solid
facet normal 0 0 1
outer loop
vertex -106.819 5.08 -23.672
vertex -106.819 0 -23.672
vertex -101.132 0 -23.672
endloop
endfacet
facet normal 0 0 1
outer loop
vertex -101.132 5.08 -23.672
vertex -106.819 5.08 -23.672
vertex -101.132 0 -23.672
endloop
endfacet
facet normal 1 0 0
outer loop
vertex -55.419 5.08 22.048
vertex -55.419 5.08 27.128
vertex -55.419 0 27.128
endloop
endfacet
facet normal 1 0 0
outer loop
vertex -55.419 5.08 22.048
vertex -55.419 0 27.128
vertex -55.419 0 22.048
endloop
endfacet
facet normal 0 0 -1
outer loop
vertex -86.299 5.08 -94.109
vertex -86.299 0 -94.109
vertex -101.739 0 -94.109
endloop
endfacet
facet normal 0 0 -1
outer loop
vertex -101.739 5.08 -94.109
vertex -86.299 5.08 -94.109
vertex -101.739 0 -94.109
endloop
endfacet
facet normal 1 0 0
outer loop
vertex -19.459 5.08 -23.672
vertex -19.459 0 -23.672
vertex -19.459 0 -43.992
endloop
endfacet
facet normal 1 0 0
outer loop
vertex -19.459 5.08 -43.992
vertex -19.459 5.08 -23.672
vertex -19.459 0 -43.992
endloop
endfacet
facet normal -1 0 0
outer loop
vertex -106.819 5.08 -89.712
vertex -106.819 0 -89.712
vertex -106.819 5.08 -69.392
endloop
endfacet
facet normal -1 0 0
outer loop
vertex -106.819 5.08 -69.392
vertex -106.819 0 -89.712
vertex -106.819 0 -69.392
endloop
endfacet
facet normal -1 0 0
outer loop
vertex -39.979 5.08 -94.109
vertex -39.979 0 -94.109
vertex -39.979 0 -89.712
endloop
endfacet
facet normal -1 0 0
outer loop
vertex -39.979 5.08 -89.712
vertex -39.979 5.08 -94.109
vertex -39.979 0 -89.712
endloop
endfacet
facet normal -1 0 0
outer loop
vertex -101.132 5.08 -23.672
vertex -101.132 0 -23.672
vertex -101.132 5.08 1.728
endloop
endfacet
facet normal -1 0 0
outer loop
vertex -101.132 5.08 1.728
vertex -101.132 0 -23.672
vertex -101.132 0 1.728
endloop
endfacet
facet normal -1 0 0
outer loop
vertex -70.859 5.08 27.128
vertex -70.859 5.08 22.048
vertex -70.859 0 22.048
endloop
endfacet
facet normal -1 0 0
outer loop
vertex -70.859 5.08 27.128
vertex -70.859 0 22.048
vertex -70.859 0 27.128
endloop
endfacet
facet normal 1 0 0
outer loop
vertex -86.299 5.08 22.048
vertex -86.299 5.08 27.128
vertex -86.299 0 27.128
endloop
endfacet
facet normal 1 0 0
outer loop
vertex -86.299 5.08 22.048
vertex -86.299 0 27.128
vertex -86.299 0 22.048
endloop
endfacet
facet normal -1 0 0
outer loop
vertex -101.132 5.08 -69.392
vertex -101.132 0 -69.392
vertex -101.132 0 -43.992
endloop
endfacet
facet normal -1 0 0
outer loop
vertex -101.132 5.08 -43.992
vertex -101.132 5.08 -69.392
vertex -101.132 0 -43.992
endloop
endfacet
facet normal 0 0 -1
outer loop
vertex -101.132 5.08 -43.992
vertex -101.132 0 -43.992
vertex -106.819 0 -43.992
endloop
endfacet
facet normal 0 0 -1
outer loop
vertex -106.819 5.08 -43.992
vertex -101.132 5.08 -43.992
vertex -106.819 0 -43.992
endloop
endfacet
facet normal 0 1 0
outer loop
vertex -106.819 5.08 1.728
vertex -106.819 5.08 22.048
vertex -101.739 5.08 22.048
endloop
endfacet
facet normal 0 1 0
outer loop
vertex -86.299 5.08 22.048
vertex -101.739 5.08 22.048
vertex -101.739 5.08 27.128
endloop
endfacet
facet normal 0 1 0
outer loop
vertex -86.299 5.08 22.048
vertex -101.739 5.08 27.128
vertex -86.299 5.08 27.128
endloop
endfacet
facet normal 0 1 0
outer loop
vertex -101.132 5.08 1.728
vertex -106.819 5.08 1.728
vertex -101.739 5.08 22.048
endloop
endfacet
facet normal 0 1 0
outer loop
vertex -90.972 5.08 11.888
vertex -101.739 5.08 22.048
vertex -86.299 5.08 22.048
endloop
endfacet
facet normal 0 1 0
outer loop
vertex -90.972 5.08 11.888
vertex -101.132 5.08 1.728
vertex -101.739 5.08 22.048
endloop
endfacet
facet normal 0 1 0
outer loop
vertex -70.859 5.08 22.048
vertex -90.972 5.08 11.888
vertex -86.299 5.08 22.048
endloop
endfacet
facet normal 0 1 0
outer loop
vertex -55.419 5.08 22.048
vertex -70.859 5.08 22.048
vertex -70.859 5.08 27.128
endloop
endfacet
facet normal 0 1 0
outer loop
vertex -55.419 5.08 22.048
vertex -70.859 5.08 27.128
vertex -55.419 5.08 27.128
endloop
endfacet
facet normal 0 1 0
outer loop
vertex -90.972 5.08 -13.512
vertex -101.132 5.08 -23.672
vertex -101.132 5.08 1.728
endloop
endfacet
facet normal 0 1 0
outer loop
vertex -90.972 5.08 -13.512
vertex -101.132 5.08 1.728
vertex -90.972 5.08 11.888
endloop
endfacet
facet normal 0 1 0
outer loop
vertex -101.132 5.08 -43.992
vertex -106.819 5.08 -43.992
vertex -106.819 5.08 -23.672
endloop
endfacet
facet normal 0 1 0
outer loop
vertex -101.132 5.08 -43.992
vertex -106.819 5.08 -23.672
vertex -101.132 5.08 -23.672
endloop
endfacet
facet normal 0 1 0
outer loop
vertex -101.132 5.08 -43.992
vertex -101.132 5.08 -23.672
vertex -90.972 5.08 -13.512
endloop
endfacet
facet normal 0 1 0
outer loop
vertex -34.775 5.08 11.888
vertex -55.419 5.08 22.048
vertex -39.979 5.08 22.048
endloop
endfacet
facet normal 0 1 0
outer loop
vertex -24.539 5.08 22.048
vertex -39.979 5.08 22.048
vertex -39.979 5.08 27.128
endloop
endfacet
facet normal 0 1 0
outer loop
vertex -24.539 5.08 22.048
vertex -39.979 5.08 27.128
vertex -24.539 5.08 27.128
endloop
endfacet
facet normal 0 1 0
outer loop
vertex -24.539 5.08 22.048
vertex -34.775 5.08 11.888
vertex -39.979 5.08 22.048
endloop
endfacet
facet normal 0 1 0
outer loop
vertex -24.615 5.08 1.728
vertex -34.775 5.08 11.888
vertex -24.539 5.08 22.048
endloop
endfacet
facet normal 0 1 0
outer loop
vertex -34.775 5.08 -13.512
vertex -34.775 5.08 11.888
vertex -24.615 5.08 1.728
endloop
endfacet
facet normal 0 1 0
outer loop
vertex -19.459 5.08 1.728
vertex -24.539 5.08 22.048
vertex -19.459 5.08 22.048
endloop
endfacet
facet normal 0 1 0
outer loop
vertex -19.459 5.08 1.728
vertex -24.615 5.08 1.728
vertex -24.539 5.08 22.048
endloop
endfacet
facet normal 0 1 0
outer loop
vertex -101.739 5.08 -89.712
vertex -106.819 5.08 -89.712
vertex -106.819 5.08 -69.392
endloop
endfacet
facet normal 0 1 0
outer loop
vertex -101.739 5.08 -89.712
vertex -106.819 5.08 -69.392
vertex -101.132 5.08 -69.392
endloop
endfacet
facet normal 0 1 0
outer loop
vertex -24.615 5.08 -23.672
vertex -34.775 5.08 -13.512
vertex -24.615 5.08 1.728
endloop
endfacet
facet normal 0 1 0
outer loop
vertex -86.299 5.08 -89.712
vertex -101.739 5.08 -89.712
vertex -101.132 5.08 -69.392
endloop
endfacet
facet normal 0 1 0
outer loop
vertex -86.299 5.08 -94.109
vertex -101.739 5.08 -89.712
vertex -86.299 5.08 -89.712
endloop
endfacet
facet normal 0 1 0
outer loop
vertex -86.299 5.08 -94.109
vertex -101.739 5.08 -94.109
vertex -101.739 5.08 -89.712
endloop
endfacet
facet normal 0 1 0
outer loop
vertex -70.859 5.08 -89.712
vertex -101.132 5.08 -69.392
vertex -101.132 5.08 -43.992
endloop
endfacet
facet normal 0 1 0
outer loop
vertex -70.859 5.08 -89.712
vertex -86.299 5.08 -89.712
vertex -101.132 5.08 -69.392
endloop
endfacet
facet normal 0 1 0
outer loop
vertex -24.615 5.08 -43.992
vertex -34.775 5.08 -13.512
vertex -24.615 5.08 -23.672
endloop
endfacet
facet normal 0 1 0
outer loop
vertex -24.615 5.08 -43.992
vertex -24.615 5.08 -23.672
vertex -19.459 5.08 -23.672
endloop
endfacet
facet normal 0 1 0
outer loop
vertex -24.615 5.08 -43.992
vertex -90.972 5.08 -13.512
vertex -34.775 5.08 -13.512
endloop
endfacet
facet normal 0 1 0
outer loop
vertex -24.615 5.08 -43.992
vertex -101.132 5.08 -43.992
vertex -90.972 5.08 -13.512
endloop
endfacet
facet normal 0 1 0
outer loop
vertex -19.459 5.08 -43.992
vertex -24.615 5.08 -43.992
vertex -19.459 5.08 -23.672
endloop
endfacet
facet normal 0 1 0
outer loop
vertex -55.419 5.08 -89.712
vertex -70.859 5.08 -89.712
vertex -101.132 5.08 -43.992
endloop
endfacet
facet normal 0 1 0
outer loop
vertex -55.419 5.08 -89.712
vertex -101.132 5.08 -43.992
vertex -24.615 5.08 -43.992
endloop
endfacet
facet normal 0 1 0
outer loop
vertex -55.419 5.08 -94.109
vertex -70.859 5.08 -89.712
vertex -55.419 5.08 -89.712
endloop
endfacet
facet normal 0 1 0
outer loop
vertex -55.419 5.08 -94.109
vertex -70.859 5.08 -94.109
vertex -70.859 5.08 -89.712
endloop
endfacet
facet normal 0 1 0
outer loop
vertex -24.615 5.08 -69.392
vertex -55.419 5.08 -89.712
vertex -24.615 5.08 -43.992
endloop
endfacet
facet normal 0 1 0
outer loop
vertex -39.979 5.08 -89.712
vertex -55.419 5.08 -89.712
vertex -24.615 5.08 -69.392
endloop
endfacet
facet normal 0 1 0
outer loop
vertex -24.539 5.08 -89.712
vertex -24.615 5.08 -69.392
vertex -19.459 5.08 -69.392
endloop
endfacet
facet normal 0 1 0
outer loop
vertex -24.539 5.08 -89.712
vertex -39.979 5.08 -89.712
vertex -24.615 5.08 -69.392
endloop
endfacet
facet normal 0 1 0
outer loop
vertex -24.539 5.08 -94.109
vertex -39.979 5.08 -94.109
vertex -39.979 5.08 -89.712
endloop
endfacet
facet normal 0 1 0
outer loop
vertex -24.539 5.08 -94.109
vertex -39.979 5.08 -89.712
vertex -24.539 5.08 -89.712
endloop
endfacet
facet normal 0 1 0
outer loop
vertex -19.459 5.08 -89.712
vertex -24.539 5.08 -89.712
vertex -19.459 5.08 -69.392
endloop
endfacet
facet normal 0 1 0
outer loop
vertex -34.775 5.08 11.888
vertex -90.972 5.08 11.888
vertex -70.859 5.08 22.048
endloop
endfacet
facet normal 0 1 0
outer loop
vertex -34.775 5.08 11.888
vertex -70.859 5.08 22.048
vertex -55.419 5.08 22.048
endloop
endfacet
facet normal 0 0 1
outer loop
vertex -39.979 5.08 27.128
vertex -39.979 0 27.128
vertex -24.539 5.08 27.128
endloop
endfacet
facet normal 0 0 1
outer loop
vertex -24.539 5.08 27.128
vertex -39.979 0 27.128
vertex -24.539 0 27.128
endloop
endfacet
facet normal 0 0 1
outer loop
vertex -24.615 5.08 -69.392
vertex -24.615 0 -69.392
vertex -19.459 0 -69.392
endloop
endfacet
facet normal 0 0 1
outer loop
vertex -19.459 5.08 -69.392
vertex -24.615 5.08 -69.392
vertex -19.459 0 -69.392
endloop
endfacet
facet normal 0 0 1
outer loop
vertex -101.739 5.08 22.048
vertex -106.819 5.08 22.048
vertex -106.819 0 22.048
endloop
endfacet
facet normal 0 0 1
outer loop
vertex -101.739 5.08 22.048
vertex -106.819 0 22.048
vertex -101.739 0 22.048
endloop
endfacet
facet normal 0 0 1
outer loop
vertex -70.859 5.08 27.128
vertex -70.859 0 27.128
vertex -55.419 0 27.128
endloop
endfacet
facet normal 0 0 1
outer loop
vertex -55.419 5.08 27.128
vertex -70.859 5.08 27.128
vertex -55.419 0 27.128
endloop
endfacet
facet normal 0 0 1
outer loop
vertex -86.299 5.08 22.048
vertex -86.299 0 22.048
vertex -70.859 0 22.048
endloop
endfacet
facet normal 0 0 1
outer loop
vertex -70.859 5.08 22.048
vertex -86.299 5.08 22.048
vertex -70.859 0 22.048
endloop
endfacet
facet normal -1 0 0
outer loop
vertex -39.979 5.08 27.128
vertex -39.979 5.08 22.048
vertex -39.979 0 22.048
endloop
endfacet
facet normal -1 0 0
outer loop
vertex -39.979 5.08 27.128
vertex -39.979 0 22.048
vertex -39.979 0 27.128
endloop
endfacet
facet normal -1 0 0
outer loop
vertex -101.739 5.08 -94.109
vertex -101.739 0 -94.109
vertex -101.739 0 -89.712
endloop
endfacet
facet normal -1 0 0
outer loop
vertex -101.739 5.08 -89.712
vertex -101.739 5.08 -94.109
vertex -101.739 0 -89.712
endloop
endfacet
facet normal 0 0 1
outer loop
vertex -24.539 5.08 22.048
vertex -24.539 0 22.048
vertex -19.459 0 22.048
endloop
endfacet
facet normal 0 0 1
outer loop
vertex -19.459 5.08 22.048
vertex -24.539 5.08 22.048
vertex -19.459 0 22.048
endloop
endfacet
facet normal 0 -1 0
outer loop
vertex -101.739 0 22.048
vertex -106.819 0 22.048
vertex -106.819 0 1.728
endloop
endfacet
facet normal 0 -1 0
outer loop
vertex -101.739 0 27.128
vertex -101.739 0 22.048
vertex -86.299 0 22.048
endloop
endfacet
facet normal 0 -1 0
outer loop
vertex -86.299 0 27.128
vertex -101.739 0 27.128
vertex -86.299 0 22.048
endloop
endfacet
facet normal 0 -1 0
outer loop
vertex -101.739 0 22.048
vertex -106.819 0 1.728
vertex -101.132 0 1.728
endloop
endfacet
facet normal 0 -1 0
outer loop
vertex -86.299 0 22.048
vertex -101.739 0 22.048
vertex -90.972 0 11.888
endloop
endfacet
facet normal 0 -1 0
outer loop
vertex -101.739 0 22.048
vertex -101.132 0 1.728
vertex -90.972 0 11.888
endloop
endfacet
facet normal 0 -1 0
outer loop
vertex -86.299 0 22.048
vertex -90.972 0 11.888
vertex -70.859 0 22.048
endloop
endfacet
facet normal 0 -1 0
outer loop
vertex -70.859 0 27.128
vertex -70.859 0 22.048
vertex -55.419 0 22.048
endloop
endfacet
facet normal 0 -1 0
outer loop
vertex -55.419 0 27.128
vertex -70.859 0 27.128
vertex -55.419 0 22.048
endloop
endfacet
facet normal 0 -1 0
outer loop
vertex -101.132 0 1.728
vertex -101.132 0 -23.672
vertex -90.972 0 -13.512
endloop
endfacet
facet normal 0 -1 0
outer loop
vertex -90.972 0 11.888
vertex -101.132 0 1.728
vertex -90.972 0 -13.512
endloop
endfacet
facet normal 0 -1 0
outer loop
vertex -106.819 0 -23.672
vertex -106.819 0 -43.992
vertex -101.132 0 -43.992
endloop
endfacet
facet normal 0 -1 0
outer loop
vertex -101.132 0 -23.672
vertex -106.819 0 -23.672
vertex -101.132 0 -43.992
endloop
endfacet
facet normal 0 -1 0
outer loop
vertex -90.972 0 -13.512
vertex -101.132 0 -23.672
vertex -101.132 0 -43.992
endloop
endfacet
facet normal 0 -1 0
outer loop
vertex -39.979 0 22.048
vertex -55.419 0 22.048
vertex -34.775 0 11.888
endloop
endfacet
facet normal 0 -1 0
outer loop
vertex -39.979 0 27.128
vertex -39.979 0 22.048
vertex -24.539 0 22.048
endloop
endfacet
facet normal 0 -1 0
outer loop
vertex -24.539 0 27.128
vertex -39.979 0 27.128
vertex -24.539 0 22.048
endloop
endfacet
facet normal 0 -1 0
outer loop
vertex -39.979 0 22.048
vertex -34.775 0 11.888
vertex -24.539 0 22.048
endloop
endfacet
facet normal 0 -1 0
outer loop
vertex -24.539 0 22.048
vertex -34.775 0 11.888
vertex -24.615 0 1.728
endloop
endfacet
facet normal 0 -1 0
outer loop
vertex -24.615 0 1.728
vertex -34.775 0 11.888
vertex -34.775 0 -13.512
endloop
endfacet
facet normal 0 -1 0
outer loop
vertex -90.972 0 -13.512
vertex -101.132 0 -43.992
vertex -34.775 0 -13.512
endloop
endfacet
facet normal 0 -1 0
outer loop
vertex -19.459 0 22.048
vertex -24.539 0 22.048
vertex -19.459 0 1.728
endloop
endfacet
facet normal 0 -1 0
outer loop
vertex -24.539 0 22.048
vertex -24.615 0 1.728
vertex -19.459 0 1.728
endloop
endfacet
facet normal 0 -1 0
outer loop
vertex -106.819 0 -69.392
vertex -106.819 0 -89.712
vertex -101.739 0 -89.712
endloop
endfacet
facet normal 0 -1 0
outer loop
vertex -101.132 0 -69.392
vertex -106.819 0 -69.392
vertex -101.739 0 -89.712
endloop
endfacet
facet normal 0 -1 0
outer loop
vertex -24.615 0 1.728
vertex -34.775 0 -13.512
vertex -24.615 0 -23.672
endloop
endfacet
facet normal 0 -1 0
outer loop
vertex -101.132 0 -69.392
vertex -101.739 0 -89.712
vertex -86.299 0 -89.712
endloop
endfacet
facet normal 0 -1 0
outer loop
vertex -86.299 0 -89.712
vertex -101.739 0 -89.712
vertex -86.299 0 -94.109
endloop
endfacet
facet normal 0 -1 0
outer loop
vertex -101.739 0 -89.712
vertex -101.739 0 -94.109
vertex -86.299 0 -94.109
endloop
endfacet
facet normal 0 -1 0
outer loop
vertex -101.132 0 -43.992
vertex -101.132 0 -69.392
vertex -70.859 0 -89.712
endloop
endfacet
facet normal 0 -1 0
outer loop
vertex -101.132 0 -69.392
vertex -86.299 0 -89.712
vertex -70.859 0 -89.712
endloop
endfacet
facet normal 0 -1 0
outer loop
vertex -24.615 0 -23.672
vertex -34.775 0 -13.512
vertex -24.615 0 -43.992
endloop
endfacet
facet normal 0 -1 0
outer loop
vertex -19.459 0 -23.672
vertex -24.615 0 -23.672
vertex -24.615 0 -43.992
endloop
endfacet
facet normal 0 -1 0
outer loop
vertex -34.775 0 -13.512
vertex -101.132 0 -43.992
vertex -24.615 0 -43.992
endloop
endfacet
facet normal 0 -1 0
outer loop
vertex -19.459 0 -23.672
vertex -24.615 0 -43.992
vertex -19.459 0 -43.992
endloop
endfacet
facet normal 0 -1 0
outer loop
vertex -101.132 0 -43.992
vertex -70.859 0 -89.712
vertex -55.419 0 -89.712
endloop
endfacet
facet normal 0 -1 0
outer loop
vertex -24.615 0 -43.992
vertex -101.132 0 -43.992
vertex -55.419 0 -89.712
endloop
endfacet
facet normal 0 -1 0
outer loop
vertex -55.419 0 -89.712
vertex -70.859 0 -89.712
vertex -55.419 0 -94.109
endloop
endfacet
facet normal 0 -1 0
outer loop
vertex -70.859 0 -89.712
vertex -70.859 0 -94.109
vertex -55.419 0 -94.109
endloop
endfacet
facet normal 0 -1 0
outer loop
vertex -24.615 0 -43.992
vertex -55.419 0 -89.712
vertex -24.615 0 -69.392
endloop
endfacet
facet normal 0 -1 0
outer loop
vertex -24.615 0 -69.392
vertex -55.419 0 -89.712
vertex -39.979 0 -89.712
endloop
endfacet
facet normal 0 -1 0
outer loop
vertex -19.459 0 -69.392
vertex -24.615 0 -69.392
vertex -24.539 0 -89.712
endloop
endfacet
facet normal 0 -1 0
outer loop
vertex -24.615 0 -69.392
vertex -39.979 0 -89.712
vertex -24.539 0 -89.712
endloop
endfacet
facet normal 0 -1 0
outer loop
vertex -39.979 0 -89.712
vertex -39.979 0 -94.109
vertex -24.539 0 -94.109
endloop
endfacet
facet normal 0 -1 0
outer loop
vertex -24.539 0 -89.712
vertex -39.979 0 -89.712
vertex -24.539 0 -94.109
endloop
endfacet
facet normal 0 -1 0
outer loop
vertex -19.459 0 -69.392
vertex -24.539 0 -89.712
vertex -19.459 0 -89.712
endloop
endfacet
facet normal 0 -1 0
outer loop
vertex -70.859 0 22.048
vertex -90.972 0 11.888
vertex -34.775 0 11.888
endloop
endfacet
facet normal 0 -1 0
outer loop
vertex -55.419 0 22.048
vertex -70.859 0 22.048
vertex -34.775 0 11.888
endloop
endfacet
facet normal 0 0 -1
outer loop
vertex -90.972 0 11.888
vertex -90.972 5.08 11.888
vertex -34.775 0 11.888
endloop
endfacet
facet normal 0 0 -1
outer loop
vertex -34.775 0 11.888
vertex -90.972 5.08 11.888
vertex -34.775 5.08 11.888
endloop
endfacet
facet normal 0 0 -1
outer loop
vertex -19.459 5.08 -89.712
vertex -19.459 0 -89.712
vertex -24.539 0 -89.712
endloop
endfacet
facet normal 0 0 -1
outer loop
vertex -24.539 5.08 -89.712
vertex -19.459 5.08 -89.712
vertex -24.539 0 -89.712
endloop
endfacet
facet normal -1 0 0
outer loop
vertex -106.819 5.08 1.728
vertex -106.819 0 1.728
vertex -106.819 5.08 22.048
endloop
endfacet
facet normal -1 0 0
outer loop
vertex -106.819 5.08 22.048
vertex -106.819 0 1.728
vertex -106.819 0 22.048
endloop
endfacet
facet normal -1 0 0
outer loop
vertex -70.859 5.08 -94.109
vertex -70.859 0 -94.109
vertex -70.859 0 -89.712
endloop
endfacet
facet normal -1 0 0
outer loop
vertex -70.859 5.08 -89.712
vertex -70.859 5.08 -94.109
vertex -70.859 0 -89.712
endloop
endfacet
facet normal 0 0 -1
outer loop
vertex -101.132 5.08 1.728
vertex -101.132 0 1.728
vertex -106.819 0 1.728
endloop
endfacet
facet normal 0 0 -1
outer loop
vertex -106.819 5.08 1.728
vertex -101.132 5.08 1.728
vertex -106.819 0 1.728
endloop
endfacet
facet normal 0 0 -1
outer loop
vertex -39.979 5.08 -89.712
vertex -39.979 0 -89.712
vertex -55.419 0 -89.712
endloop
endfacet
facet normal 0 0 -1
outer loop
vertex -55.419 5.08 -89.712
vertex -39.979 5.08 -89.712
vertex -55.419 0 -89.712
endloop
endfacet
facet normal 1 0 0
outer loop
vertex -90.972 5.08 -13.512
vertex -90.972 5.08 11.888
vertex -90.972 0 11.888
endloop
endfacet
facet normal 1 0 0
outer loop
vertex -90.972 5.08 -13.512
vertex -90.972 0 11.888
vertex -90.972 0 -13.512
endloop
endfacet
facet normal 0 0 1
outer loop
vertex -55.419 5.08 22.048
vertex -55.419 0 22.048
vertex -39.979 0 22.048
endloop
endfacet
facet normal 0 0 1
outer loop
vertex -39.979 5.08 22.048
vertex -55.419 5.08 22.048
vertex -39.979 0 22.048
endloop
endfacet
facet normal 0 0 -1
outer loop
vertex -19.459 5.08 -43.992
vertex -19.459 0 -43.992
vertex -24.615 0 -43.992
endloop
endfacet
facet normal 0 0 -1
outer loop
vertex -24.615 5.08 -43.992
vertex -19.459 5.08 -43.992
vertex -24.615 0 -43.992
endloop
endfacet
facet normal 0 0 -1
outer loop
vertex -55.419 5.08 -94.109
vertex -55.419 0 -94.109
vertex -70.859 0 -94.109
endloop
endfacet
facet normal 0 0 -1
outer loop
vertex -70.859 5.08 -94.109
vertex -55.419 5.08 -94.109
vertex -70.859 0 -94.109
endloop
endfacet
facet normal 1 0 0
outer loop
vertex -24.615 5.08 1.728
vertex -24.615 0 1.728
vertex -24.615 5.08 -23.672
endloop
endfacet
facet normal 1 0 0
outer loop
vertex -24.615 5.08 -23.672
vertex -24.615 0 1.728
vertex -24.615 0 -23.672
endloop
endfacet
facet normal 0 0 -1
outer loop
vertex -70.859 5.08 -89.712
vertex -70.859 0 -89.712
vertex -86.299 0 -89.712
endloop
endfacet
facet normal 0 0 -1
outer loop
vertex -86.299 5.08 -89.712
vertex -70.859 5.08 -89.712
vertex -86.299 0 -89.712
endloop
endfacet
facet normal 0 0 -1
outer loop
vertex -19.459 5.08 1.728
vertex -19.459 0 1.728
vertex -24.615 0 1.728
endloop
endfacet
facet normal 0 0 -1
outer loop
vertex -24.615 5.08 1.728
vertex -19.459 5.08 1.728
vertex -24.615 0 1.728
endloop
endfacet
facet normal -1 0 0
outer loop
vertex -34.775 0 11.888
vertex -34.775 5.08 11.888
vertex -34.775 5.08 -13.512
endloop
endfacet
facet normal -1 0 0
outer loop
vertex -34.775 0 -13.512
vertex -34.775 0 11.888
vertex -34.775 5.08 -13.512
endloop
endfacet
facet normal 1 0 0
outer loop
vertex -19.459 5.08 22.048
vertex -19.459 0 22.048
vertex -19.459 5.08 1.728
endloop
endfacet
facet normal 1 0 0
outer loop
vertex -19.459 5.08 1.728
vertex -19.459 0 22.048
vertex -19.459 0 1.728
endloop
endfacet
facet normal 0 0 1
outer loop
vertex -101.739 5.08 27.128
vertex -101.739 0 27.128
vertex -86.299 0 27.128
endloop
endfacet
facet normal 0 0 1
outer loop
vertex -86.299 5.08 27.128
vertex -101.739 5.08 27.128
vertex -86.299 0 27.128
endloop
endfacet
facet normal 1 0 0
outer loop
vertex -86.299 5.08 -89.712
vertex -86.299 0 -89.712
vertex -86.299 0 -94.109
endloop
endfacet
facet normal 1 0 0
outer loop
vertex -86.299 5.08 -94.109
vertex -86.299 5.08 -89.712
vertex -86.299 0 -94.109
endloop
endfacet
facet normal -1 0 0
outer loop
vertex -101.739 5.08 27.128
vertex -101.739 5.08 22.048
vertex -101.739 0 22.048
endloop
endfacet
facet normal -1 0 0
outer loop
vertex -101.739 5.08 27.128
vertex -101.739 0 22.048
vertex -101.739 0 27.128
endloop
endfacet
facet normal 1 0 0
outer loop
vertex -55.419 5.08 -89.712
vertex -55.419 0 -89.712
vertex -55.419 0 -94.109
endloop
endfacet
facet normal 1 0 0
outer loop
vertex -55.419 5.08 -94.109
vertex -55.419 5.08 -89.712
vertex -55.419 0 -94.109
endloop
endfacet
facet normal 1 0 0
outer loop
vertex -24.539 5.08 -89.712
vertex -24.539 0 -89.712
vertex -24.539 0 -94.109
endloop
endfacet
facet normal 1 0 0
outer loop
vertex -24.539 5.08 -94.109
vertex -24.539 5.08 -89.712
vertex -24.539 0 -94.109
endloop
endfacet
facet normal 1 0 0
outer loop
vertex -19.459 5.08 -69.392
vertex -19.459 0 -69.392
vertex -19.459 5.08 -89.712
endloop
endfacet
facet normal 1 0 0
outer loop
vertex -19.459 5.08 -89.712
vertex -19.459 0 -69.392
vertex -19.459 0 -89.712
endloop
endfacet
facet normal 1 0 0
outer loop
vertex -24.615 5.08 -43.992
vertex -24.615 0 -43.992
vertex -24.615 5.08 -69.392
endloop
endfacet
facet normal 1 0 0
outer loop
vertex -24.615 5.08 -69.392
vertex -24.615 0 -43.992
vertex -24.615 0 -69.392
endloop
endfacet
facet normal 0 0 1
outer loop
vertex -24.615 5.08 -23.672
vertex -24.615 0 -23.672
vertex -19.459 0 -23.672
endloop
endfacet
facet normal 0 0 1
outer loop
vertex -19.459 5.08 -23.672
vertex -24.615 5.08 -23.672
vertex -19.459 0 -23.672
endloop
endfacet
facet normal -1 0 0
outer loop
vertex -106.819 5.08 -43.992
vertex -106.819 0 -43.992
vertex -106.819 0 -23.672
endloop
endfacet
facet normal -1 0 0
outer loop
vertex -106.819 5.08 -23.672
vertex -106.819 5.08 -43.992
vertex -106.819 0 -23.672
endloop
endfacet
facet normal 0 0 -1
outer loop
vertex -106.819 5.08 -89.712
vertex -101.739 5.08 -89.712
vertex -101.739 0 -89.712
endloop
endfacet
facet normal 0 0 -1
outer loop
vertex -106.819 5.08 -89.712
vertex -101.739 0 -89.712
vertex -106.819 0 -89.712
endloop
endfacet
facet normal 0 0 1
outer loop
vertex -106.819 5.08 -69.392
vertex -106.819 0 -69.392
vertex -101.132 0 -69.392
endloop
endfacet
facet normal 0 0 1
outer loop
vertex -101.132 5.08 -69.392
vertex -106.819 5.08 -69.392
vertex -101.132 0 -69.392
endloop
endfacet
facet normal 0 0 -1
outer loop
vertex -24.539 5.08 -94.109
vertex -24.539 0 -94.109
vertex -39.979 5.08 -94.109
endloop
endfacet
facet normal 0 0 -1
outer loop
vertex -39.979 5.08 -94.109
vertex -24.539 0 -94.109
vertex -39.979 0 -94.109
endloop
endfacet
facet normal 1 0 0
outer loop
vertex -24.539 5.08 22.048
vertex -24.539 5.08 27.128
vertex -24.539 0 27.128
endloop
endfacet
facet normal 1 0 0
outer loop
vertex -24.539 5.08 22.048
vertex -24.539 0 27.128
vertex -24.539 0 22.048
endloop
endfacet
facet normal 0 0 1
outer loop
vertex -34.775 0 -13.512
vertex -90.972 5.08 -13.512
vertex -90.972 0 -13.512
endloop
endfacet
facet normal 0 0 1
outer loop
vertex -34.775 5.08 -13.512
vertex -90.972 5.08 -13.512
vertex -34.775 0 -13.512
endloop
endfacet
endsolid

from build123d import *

# Parameters (mm, degrees)
BOSS_EXTRUDE1_DEPTH = 5.08
SKETCH5_W           = 56.19760994
SKETCH5_H           = 25.4
CUT_EXTRUDE1_DEPTH  = 50.8


with BuildPart() as part:
    # Sketch1 → Boss-Extrude1 (new body)
    with BuildSketch(Plane(origin=(0, 0, 0), x_dir=(1, 0, 0), z_dir=(0, 1, 0))):
        Polygon((-101.738774191, -22.048282475), (-101.738774191, -27.128282475), (-86.298774591, -27.128282475), (-86.298774591, -22.048282475), (-70.858774991, -22.048282475), (-70.858774991, -27.128282475), (-55.418775391, -27.128282475), (-55.418775391, -22.048282475), (-39.978775791, -22.048282475), (-39.978775791, -27.128282475), (-24.538776191, -27.128282475), (-24.538776191, -22.048282475), (-19.458776191, -22.048282475), (-19.458776191, -1.728282475), (-24.614597086, -1.728282475), (-24.614597086, 23.671717525), (-19.458776191, 23.671717525), (-19.458776191, 43.991717525), (-24.614597086, 43.991717525), (-24.614597086, 69.391717525), (-19.458776191, 69.391717525), (-19.458776191, 89.711717525), (-24.538776191, 89.711717525), (-24.538776191, 94.109329465), (-39.978775791, 94.109329465), (-39.978775791, 89.711717525), (-55.418775391, 89.711717525), (-55.418775391, 94.109329465), (-70.858774991, 94.109329465), (-70.858774991, 89.711717525), (-86.298774591, 89.711717525), (-86.298774591, 94.109329465), (-101.738774191, 94.109329465), (-101.738774191, 89.711717525), (-106.818774191, 89.711717525), (-106.818774191, 69.391717525), (-101.132207026, 69.391717525), (-101.132207026, 43.991717525), (-106.818774191, 43.991717525), (-106.818774191, 23.671717525), (-101.132207026, 23.671717525), (-101.132207026, -1.728282475), (-106.818774191, -1.728282475), (-106.818774191, -22.048282475), align=None)
    extrude(amount=BOSS_EXTRUDE1_DEPTH)

    # Sketch5 → Cut-Extrude1 (cut)
    with BuildSketch(Plane(origin=(0, 5.08, 0), x_dir=(1, 0, 0), z_dir=(0, 1, 0))):
        with Locations((-62.873402056, 0.811717525)):
            Rectangle(SKETCH5_W, SKETCH5_H)
    extrude(amount=-CUT_EXTRUDE1_DEPTH, mode=Mode.SUBTRACT)


solid = part.part
